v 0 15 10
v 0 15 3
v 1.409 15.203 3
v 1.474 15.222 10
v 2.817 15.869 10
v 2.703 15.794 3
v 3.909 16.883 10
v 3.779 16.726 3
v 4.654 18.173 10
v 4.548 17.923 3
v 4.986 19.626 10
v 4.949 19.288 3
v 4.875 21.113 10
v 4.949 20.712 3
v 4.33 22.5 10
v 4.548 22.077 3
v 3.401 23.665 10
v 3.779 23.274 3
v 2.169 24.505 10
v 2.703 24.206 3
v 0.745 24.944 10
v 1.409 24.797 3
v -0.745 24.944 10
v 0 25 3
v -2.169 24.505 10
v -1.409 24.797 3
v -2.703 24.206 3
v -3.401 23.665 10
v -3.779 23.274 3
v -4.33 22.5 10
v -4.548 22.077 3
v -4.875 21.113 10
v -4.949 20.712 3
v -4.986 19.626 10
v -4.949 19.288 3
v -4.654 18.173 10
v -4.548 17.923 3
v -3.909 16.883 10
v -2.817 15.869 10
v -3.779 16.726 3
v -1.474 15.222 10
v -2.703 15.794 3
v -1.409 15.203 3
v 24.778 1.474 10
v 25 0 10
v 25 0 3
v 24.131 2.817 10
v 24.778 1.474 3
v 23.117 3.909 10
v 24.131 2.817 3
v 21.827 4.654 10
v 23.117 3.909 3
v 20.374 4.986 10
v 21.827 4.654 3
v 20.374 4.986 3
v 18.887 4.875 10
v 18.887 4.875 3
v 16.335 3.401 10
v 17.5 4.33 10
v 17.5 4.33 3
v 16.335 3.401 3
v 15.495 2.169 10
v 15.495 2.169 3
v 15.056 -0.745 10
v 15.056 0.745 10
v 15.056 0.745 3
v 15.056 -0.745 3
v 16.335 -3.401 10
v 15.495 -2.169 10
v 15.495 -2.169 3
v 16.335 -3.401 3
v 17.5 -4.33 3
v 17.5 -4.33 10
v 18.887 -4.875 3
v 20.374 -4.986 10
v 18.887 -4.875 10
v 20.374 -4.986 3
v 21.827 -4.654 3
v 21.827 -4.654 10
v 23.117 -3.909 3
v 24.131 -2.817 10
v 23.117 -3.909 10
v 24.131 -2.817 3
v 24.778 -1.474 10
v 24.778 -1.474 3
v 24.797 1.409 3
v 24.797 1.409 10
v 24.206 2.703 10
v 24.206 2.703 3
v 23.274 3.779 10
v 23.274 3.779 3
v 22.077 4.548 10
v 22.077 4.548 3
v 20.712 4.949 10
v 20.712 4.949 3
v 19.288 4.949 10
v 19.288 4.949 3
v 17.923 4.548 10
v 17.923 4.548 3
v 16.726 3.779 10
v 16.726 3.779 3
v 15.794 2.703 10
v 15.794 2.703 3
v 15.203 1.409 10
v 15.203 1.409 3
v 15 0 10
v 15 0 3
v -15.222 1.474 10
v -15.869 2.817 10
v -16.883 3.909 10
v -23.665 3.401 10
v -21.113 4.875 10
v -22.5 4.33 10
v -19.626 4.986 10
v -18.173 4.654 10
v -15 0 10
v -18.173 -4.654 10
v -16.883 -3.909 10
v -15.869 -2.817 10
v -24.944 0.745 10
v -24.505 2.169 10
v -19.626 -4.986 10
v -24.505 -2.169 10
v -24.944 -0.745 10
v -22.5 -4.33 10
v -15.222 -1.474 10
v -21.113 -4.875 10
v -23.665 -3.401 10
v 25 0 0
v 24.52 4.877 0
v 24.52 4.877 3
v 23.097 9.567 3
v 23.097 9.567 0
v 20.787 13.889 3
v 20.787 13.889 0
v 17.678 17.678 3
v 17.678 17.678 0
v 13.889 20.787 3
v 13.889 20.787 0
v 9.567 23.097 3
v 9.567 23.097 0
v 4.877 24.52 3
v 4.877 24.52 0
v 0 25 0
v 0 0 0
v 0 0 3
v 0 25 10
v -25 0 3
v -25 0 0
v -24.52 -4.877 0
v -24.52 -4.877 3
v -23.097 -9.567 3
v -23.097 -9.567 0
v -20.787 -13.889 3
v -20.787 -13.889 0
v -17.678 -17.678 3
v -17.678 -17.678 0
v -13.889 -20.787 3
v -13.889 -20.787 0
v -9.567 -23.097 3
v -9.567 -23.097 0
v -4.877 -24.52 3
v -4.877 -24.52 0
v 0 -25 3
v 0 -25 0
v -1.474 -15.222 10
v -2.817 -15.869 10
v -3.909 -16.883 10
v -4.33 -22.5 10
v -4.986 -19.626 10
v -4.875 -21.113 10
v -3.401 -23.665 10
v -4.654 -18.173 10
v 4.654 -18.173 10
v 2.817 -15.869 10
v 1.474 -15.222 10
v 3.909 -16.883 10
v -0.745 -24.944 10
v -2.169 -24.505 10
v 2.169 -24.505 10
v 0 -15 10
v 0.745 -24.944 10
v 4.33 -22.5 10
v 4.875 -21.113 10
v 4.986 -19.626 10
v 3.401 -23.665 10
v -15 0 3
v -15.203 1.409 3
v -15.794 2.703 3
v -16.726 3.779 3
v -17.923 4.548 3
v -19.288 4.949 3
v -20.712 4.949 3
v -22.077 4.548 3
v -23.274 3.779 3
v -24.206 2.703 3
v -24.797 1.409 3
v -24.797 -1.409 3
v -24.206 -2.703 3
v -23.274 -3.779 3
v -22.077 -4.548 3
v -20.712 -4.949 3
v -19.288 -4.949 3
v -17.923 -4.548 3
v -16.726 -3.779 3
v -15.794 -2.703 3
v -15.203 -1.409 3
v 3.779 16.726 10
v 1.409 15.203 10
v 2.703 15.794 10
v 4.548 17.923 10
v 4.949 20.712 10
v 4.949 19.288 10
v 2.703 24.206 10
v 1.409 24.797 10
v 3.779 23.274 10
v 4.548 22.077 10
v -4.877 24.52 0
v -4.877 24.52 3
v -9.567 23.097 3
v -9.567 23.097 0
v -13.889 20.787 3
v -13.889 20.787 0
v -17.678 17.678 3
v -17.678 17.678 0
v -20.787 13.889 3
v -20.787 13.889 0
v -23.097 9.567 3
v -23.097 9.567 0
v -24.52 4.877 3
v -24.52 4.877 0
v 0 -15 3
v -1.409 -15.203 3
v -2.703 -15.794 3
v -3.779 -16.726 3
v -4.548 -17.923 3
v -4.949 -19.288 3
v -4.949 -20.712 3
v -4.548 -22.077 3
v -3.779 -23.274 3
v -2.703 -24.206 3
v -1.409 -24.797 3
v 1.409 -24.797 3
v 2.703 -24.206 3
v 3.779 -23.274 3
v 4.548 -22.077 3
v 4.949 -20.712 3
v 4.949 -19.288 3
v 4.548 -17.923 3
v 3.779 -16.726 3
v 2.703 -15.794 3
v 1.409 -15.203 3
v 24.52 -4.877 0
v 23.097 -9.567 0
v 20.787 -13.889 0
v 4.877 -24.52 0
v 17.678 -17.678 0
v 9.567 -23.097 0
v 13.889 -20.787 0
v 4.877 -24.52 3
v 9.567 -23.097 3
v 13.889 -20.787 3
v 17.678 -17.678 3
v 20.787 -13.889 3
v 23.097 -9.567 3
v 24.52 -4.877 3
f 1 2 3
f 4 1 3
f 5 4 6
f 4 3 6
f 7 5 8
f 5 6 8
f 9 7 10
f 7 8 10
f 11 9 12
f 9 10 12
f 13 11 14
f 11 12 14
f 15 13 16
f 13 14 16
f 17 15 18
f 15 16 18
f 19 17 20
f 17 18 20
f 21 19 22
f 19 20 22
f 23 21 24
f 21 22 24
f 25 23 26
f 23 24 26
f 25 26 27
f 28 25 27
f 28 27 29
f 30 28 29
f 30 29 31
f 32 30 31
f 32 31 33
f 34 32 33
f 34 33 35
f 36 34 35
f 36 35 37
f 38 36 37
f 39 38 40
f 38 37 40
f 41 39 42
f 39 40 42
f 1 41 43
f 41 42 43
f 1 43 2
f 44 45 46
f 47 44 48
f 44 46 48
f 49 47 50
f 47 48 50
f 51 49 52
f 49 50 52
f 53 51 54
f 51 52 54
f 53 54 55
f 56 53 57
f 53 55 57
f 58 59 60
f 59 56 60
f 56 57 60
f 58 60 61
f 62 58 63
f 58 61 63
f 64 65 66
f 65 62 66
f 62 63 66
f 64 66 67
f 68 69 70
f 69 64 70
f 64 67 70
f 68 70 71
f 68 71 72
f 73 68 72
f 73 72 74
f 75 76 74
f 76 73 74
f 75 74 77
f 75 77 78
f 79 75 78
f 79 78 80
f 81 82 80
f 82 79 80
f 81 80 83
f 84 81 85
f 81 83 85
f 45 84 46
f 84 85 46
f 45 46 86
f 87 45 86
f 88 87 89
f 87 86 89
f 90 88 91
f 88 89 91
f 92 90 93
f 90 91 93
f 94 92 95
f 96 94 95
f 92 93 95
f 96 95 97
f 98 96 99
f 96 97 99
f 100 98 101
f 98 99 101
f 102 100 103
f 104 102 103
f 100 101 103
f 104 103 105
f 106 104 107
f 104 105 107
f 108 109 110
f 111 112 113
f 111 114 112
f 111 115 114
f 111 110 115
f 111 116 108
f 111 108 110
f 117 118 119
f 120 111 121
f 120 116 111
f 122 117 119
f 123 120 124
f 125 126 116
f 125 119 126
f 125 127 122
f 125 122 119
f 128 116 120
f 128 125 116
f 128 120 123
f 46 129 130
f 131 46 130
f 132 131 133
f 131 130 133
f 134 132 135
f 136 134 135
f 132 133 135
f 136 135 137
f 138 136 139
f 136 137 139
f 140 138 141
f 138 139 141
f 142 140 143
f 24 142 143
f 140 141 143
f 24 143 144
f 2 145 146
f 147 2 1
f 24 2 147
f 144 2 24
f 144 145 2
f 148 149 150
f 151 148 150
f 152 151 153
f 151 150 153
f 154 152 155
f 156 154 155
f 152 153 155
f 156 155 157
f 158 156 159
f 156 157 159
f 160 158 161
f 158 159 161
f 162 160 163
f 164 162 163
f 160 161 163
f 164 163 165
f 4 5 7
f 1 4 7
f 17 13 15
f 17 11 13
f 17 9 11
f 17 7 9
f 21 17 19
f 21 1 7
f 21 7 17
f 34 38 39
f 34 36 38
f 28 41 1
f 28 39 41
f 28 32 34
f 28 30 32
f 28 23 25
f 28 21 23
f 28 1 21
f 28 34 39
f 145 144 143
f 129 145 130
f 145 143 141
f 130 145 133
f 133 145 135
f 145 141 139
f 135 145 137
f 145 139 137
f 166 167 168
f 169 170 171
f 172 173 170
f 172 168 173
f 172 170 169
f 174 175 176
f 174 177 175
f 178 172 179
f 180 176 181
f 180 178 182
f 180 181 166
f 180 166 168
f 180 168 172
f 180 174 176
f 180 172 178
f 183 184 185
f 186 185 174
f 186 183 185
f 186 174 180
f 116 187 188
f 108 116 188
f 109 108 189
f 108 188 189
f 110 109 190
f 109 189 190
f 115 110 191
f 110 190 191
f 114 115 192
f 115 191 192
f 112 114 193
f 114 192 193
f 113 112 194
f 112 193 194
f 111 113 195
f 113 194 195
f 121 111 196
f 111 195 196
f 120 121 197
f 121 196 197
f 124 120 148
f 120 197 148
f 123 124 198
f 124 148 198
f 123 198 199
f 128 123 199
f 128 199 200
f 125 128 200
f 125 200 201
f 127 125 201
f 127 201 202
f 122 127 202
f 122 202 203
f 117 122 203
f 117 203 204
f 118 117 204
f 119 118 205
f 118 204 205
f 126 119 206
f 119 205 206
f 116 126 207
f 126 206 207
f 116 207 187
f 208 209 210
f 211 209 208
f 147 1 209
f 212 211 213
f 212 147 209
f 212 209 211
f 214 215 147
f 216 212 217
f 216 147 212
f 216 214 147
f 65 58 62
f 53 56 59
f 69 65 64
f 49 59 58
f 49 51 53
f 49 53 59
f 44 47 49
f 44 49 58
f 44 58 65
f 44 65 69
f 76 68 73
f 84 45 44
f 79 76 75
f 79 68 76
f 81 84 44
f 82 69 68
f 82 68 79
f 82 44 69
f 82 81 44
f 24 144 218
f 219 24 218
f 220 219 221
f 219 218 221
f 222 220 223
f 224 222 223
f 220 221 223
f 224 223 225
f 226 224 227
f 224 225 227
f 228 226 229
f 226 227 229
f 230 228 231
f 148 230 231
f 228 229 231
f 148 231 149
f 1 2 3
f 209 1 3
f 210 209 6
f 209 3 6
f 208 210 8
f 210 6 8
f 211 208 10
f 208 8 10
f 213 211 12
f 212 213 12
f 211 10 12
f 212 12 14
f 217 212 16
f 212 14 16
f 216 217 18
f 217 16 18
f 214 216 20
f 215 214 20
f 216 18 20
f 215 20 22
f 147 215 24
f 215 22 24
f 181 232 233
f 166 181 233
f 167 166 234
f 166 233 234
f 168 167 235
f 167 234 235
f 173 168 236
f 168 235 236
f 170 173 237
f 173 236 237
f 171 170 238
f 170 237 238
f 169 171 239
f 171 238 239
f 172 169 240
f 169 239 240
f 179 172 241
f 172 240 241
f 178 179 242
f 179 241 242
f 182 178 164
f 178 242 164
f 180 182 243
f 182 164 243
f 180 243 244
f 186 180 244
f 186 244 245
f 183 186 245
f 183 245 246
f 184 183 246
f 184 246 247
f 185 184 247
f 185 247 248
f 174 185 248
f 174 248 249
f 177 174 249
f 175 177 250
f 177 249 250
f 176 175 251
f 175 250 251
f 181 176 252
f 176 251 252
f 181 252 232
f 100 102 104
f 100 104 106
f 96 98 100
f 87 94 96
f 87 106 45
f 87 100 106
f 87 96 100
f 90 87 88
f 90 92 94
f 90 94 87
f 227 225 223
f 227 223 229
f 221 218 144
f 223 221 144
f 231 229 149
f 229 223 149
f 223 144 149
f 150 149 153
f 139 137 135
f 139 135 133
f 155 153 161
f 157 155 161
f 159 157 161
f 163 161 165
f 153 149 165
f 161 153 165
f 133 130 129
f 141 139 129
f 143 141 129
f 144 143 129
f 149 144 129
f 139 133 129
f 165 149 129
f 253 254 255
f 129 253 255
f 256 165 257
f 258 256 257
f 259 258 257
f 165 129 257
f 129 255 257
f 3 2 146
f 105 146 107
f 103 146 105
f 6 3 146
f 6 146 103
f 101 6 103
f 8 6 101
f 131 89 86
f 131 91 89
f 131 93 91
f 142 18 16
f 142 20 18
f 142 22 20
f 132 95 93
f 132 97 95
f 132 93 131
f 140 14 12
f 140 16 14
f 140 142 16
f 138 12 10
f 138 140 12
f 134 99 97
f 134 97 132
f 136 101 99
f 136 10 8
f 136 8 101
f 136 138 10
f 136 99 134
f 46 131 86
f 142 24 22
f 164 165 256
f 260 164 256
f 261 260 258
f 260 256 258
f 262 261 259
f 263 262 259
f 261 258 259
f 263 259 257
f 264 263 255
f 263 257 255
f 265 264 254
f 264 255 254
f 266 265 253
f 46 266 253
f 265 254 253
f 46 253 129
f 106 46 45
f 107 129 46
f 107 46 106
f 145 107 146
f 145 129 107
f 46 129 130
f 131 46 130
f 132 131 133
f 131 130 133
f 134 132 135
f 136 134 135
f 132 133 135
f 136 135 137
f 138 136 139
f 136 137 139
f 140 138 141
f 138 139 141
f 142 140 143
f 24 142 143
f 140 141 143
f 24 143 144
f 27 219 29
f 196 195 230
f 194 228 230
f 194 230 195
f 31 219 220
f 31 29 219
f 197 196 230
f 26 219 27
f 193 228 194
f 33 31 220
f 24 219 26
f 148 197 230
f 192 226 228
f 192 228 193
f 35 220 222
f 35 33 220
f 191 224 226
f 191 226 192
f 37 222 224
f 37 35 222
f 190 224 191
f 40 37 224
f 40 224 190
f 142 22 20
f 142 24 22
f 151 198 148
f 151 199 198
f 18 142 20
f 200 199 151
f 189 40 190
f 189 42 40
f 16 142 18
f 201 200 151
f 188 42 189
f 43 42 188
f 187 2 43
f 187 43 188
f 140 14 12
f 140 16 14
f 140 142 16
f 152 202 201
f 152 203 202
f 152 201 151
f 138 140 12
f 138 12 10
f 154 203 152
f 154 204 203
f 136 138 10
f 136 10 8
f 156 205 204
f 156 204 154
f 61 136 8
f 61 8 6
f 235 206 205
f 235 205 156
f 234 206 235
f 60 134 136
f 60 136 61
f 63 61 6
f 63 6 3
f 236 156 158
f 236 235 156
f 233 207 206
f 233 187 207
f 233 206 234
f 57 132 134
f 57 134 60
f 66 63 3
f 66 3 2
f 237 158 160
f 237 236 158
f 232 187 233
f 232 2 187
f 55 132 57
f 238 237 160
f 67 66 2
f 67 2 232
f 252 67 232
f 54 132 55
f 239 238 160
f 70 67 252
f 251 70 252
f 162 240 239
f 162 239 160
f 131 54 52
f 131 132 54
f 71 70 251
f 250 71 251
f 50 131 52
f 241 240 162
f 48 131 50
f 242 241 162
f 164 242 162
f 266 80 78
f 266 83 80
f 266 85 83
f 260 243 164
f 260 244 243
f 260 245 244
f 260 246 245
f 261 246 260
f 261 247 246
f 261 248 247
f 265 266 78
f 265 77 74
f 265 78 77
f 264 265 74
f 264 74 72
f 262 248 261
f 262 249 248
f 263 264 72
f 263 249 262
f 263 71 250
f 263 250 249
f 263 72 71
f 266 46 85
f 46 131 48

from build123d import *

# Parameters (mm, degrees)
PAD_DEPTH          = 3
PAD001_DEPTH       = 7
PAD002_DEPTH       = 3
PAD003_DEPTH       = 7
POLARPATTERN_COUNT = 4


with BuildPart() as semi_circle:
    # Sketch → Pad (new body)
    with BuildSketch(Plane.XY):
        with BuildLine():
            ThreePointArc((25, 0), (17.67767, 17.67767), (0, 25))
            Line((0, 0), (0, 25))
            Line((25, 0), (0, 0))
        make_face()
    extrude(amount=PAD_DEPTH)

    # Sketch001 (on Face5 of Pad) → Pad001 (join)
    with BuildSketch(Plane.XY.offset(3)):
        with BuildLine():
            ThreePointArc((0, 15), (5, 20), (0, 25))
            Line((0, 15), (0, 25))
        make_face()
        with BuildLine():
            ThreePointArc((25, 0), (20, 5), (15, 0))
            Line((15, 0), (25, 0))
        make_face()
    extrude(amount=PAD001_DEPTH)


with BuildPart() as circle:
    # Sketch002 → Pad002 (new body)
    with BuildSketch(Plane.XY):
        with BuildLine():
            ThreePointArc((25, 0), (17.67767, 17.67767), (0, 25))
            Line((0, 0), (0, 25))
            Line((25, 0), (0, 0))
        make_face()
    extrude(amount=PAD002_DEPTH)

    # Sketch003 (on Face5 of Pad002) → Pad003 (join)
    with BuildSketch(Plane.XY.offset(3)):
        with BuildLine():
            ThreePointArc((0, 15), (5, 20), (0, 25))
            Line((0, 15), (0, 25))
        make_face()
        with BuildLine():
            ThreePointArc((25, 0), (20, 5), (15, 0))
            Line((15, 0), (25, 0))
        make_face()
    extrude(amount=PAD003_DEPTH)

    # PolarPattern: Circle ×4 about axis
    polarpattern_axis = Axis((0, 0, 3), (0, 0, 1))


with BuildPart() as circle_1:
    add(circle.part)
    for i in range(1, POLARPATTERN_COUNT):
        add(circle.part.rotate(polarpattern_axis, i * 360 / POLARPATTERN_COUNT))


solid = Compound([semi_circle.part, circle_1.part])
